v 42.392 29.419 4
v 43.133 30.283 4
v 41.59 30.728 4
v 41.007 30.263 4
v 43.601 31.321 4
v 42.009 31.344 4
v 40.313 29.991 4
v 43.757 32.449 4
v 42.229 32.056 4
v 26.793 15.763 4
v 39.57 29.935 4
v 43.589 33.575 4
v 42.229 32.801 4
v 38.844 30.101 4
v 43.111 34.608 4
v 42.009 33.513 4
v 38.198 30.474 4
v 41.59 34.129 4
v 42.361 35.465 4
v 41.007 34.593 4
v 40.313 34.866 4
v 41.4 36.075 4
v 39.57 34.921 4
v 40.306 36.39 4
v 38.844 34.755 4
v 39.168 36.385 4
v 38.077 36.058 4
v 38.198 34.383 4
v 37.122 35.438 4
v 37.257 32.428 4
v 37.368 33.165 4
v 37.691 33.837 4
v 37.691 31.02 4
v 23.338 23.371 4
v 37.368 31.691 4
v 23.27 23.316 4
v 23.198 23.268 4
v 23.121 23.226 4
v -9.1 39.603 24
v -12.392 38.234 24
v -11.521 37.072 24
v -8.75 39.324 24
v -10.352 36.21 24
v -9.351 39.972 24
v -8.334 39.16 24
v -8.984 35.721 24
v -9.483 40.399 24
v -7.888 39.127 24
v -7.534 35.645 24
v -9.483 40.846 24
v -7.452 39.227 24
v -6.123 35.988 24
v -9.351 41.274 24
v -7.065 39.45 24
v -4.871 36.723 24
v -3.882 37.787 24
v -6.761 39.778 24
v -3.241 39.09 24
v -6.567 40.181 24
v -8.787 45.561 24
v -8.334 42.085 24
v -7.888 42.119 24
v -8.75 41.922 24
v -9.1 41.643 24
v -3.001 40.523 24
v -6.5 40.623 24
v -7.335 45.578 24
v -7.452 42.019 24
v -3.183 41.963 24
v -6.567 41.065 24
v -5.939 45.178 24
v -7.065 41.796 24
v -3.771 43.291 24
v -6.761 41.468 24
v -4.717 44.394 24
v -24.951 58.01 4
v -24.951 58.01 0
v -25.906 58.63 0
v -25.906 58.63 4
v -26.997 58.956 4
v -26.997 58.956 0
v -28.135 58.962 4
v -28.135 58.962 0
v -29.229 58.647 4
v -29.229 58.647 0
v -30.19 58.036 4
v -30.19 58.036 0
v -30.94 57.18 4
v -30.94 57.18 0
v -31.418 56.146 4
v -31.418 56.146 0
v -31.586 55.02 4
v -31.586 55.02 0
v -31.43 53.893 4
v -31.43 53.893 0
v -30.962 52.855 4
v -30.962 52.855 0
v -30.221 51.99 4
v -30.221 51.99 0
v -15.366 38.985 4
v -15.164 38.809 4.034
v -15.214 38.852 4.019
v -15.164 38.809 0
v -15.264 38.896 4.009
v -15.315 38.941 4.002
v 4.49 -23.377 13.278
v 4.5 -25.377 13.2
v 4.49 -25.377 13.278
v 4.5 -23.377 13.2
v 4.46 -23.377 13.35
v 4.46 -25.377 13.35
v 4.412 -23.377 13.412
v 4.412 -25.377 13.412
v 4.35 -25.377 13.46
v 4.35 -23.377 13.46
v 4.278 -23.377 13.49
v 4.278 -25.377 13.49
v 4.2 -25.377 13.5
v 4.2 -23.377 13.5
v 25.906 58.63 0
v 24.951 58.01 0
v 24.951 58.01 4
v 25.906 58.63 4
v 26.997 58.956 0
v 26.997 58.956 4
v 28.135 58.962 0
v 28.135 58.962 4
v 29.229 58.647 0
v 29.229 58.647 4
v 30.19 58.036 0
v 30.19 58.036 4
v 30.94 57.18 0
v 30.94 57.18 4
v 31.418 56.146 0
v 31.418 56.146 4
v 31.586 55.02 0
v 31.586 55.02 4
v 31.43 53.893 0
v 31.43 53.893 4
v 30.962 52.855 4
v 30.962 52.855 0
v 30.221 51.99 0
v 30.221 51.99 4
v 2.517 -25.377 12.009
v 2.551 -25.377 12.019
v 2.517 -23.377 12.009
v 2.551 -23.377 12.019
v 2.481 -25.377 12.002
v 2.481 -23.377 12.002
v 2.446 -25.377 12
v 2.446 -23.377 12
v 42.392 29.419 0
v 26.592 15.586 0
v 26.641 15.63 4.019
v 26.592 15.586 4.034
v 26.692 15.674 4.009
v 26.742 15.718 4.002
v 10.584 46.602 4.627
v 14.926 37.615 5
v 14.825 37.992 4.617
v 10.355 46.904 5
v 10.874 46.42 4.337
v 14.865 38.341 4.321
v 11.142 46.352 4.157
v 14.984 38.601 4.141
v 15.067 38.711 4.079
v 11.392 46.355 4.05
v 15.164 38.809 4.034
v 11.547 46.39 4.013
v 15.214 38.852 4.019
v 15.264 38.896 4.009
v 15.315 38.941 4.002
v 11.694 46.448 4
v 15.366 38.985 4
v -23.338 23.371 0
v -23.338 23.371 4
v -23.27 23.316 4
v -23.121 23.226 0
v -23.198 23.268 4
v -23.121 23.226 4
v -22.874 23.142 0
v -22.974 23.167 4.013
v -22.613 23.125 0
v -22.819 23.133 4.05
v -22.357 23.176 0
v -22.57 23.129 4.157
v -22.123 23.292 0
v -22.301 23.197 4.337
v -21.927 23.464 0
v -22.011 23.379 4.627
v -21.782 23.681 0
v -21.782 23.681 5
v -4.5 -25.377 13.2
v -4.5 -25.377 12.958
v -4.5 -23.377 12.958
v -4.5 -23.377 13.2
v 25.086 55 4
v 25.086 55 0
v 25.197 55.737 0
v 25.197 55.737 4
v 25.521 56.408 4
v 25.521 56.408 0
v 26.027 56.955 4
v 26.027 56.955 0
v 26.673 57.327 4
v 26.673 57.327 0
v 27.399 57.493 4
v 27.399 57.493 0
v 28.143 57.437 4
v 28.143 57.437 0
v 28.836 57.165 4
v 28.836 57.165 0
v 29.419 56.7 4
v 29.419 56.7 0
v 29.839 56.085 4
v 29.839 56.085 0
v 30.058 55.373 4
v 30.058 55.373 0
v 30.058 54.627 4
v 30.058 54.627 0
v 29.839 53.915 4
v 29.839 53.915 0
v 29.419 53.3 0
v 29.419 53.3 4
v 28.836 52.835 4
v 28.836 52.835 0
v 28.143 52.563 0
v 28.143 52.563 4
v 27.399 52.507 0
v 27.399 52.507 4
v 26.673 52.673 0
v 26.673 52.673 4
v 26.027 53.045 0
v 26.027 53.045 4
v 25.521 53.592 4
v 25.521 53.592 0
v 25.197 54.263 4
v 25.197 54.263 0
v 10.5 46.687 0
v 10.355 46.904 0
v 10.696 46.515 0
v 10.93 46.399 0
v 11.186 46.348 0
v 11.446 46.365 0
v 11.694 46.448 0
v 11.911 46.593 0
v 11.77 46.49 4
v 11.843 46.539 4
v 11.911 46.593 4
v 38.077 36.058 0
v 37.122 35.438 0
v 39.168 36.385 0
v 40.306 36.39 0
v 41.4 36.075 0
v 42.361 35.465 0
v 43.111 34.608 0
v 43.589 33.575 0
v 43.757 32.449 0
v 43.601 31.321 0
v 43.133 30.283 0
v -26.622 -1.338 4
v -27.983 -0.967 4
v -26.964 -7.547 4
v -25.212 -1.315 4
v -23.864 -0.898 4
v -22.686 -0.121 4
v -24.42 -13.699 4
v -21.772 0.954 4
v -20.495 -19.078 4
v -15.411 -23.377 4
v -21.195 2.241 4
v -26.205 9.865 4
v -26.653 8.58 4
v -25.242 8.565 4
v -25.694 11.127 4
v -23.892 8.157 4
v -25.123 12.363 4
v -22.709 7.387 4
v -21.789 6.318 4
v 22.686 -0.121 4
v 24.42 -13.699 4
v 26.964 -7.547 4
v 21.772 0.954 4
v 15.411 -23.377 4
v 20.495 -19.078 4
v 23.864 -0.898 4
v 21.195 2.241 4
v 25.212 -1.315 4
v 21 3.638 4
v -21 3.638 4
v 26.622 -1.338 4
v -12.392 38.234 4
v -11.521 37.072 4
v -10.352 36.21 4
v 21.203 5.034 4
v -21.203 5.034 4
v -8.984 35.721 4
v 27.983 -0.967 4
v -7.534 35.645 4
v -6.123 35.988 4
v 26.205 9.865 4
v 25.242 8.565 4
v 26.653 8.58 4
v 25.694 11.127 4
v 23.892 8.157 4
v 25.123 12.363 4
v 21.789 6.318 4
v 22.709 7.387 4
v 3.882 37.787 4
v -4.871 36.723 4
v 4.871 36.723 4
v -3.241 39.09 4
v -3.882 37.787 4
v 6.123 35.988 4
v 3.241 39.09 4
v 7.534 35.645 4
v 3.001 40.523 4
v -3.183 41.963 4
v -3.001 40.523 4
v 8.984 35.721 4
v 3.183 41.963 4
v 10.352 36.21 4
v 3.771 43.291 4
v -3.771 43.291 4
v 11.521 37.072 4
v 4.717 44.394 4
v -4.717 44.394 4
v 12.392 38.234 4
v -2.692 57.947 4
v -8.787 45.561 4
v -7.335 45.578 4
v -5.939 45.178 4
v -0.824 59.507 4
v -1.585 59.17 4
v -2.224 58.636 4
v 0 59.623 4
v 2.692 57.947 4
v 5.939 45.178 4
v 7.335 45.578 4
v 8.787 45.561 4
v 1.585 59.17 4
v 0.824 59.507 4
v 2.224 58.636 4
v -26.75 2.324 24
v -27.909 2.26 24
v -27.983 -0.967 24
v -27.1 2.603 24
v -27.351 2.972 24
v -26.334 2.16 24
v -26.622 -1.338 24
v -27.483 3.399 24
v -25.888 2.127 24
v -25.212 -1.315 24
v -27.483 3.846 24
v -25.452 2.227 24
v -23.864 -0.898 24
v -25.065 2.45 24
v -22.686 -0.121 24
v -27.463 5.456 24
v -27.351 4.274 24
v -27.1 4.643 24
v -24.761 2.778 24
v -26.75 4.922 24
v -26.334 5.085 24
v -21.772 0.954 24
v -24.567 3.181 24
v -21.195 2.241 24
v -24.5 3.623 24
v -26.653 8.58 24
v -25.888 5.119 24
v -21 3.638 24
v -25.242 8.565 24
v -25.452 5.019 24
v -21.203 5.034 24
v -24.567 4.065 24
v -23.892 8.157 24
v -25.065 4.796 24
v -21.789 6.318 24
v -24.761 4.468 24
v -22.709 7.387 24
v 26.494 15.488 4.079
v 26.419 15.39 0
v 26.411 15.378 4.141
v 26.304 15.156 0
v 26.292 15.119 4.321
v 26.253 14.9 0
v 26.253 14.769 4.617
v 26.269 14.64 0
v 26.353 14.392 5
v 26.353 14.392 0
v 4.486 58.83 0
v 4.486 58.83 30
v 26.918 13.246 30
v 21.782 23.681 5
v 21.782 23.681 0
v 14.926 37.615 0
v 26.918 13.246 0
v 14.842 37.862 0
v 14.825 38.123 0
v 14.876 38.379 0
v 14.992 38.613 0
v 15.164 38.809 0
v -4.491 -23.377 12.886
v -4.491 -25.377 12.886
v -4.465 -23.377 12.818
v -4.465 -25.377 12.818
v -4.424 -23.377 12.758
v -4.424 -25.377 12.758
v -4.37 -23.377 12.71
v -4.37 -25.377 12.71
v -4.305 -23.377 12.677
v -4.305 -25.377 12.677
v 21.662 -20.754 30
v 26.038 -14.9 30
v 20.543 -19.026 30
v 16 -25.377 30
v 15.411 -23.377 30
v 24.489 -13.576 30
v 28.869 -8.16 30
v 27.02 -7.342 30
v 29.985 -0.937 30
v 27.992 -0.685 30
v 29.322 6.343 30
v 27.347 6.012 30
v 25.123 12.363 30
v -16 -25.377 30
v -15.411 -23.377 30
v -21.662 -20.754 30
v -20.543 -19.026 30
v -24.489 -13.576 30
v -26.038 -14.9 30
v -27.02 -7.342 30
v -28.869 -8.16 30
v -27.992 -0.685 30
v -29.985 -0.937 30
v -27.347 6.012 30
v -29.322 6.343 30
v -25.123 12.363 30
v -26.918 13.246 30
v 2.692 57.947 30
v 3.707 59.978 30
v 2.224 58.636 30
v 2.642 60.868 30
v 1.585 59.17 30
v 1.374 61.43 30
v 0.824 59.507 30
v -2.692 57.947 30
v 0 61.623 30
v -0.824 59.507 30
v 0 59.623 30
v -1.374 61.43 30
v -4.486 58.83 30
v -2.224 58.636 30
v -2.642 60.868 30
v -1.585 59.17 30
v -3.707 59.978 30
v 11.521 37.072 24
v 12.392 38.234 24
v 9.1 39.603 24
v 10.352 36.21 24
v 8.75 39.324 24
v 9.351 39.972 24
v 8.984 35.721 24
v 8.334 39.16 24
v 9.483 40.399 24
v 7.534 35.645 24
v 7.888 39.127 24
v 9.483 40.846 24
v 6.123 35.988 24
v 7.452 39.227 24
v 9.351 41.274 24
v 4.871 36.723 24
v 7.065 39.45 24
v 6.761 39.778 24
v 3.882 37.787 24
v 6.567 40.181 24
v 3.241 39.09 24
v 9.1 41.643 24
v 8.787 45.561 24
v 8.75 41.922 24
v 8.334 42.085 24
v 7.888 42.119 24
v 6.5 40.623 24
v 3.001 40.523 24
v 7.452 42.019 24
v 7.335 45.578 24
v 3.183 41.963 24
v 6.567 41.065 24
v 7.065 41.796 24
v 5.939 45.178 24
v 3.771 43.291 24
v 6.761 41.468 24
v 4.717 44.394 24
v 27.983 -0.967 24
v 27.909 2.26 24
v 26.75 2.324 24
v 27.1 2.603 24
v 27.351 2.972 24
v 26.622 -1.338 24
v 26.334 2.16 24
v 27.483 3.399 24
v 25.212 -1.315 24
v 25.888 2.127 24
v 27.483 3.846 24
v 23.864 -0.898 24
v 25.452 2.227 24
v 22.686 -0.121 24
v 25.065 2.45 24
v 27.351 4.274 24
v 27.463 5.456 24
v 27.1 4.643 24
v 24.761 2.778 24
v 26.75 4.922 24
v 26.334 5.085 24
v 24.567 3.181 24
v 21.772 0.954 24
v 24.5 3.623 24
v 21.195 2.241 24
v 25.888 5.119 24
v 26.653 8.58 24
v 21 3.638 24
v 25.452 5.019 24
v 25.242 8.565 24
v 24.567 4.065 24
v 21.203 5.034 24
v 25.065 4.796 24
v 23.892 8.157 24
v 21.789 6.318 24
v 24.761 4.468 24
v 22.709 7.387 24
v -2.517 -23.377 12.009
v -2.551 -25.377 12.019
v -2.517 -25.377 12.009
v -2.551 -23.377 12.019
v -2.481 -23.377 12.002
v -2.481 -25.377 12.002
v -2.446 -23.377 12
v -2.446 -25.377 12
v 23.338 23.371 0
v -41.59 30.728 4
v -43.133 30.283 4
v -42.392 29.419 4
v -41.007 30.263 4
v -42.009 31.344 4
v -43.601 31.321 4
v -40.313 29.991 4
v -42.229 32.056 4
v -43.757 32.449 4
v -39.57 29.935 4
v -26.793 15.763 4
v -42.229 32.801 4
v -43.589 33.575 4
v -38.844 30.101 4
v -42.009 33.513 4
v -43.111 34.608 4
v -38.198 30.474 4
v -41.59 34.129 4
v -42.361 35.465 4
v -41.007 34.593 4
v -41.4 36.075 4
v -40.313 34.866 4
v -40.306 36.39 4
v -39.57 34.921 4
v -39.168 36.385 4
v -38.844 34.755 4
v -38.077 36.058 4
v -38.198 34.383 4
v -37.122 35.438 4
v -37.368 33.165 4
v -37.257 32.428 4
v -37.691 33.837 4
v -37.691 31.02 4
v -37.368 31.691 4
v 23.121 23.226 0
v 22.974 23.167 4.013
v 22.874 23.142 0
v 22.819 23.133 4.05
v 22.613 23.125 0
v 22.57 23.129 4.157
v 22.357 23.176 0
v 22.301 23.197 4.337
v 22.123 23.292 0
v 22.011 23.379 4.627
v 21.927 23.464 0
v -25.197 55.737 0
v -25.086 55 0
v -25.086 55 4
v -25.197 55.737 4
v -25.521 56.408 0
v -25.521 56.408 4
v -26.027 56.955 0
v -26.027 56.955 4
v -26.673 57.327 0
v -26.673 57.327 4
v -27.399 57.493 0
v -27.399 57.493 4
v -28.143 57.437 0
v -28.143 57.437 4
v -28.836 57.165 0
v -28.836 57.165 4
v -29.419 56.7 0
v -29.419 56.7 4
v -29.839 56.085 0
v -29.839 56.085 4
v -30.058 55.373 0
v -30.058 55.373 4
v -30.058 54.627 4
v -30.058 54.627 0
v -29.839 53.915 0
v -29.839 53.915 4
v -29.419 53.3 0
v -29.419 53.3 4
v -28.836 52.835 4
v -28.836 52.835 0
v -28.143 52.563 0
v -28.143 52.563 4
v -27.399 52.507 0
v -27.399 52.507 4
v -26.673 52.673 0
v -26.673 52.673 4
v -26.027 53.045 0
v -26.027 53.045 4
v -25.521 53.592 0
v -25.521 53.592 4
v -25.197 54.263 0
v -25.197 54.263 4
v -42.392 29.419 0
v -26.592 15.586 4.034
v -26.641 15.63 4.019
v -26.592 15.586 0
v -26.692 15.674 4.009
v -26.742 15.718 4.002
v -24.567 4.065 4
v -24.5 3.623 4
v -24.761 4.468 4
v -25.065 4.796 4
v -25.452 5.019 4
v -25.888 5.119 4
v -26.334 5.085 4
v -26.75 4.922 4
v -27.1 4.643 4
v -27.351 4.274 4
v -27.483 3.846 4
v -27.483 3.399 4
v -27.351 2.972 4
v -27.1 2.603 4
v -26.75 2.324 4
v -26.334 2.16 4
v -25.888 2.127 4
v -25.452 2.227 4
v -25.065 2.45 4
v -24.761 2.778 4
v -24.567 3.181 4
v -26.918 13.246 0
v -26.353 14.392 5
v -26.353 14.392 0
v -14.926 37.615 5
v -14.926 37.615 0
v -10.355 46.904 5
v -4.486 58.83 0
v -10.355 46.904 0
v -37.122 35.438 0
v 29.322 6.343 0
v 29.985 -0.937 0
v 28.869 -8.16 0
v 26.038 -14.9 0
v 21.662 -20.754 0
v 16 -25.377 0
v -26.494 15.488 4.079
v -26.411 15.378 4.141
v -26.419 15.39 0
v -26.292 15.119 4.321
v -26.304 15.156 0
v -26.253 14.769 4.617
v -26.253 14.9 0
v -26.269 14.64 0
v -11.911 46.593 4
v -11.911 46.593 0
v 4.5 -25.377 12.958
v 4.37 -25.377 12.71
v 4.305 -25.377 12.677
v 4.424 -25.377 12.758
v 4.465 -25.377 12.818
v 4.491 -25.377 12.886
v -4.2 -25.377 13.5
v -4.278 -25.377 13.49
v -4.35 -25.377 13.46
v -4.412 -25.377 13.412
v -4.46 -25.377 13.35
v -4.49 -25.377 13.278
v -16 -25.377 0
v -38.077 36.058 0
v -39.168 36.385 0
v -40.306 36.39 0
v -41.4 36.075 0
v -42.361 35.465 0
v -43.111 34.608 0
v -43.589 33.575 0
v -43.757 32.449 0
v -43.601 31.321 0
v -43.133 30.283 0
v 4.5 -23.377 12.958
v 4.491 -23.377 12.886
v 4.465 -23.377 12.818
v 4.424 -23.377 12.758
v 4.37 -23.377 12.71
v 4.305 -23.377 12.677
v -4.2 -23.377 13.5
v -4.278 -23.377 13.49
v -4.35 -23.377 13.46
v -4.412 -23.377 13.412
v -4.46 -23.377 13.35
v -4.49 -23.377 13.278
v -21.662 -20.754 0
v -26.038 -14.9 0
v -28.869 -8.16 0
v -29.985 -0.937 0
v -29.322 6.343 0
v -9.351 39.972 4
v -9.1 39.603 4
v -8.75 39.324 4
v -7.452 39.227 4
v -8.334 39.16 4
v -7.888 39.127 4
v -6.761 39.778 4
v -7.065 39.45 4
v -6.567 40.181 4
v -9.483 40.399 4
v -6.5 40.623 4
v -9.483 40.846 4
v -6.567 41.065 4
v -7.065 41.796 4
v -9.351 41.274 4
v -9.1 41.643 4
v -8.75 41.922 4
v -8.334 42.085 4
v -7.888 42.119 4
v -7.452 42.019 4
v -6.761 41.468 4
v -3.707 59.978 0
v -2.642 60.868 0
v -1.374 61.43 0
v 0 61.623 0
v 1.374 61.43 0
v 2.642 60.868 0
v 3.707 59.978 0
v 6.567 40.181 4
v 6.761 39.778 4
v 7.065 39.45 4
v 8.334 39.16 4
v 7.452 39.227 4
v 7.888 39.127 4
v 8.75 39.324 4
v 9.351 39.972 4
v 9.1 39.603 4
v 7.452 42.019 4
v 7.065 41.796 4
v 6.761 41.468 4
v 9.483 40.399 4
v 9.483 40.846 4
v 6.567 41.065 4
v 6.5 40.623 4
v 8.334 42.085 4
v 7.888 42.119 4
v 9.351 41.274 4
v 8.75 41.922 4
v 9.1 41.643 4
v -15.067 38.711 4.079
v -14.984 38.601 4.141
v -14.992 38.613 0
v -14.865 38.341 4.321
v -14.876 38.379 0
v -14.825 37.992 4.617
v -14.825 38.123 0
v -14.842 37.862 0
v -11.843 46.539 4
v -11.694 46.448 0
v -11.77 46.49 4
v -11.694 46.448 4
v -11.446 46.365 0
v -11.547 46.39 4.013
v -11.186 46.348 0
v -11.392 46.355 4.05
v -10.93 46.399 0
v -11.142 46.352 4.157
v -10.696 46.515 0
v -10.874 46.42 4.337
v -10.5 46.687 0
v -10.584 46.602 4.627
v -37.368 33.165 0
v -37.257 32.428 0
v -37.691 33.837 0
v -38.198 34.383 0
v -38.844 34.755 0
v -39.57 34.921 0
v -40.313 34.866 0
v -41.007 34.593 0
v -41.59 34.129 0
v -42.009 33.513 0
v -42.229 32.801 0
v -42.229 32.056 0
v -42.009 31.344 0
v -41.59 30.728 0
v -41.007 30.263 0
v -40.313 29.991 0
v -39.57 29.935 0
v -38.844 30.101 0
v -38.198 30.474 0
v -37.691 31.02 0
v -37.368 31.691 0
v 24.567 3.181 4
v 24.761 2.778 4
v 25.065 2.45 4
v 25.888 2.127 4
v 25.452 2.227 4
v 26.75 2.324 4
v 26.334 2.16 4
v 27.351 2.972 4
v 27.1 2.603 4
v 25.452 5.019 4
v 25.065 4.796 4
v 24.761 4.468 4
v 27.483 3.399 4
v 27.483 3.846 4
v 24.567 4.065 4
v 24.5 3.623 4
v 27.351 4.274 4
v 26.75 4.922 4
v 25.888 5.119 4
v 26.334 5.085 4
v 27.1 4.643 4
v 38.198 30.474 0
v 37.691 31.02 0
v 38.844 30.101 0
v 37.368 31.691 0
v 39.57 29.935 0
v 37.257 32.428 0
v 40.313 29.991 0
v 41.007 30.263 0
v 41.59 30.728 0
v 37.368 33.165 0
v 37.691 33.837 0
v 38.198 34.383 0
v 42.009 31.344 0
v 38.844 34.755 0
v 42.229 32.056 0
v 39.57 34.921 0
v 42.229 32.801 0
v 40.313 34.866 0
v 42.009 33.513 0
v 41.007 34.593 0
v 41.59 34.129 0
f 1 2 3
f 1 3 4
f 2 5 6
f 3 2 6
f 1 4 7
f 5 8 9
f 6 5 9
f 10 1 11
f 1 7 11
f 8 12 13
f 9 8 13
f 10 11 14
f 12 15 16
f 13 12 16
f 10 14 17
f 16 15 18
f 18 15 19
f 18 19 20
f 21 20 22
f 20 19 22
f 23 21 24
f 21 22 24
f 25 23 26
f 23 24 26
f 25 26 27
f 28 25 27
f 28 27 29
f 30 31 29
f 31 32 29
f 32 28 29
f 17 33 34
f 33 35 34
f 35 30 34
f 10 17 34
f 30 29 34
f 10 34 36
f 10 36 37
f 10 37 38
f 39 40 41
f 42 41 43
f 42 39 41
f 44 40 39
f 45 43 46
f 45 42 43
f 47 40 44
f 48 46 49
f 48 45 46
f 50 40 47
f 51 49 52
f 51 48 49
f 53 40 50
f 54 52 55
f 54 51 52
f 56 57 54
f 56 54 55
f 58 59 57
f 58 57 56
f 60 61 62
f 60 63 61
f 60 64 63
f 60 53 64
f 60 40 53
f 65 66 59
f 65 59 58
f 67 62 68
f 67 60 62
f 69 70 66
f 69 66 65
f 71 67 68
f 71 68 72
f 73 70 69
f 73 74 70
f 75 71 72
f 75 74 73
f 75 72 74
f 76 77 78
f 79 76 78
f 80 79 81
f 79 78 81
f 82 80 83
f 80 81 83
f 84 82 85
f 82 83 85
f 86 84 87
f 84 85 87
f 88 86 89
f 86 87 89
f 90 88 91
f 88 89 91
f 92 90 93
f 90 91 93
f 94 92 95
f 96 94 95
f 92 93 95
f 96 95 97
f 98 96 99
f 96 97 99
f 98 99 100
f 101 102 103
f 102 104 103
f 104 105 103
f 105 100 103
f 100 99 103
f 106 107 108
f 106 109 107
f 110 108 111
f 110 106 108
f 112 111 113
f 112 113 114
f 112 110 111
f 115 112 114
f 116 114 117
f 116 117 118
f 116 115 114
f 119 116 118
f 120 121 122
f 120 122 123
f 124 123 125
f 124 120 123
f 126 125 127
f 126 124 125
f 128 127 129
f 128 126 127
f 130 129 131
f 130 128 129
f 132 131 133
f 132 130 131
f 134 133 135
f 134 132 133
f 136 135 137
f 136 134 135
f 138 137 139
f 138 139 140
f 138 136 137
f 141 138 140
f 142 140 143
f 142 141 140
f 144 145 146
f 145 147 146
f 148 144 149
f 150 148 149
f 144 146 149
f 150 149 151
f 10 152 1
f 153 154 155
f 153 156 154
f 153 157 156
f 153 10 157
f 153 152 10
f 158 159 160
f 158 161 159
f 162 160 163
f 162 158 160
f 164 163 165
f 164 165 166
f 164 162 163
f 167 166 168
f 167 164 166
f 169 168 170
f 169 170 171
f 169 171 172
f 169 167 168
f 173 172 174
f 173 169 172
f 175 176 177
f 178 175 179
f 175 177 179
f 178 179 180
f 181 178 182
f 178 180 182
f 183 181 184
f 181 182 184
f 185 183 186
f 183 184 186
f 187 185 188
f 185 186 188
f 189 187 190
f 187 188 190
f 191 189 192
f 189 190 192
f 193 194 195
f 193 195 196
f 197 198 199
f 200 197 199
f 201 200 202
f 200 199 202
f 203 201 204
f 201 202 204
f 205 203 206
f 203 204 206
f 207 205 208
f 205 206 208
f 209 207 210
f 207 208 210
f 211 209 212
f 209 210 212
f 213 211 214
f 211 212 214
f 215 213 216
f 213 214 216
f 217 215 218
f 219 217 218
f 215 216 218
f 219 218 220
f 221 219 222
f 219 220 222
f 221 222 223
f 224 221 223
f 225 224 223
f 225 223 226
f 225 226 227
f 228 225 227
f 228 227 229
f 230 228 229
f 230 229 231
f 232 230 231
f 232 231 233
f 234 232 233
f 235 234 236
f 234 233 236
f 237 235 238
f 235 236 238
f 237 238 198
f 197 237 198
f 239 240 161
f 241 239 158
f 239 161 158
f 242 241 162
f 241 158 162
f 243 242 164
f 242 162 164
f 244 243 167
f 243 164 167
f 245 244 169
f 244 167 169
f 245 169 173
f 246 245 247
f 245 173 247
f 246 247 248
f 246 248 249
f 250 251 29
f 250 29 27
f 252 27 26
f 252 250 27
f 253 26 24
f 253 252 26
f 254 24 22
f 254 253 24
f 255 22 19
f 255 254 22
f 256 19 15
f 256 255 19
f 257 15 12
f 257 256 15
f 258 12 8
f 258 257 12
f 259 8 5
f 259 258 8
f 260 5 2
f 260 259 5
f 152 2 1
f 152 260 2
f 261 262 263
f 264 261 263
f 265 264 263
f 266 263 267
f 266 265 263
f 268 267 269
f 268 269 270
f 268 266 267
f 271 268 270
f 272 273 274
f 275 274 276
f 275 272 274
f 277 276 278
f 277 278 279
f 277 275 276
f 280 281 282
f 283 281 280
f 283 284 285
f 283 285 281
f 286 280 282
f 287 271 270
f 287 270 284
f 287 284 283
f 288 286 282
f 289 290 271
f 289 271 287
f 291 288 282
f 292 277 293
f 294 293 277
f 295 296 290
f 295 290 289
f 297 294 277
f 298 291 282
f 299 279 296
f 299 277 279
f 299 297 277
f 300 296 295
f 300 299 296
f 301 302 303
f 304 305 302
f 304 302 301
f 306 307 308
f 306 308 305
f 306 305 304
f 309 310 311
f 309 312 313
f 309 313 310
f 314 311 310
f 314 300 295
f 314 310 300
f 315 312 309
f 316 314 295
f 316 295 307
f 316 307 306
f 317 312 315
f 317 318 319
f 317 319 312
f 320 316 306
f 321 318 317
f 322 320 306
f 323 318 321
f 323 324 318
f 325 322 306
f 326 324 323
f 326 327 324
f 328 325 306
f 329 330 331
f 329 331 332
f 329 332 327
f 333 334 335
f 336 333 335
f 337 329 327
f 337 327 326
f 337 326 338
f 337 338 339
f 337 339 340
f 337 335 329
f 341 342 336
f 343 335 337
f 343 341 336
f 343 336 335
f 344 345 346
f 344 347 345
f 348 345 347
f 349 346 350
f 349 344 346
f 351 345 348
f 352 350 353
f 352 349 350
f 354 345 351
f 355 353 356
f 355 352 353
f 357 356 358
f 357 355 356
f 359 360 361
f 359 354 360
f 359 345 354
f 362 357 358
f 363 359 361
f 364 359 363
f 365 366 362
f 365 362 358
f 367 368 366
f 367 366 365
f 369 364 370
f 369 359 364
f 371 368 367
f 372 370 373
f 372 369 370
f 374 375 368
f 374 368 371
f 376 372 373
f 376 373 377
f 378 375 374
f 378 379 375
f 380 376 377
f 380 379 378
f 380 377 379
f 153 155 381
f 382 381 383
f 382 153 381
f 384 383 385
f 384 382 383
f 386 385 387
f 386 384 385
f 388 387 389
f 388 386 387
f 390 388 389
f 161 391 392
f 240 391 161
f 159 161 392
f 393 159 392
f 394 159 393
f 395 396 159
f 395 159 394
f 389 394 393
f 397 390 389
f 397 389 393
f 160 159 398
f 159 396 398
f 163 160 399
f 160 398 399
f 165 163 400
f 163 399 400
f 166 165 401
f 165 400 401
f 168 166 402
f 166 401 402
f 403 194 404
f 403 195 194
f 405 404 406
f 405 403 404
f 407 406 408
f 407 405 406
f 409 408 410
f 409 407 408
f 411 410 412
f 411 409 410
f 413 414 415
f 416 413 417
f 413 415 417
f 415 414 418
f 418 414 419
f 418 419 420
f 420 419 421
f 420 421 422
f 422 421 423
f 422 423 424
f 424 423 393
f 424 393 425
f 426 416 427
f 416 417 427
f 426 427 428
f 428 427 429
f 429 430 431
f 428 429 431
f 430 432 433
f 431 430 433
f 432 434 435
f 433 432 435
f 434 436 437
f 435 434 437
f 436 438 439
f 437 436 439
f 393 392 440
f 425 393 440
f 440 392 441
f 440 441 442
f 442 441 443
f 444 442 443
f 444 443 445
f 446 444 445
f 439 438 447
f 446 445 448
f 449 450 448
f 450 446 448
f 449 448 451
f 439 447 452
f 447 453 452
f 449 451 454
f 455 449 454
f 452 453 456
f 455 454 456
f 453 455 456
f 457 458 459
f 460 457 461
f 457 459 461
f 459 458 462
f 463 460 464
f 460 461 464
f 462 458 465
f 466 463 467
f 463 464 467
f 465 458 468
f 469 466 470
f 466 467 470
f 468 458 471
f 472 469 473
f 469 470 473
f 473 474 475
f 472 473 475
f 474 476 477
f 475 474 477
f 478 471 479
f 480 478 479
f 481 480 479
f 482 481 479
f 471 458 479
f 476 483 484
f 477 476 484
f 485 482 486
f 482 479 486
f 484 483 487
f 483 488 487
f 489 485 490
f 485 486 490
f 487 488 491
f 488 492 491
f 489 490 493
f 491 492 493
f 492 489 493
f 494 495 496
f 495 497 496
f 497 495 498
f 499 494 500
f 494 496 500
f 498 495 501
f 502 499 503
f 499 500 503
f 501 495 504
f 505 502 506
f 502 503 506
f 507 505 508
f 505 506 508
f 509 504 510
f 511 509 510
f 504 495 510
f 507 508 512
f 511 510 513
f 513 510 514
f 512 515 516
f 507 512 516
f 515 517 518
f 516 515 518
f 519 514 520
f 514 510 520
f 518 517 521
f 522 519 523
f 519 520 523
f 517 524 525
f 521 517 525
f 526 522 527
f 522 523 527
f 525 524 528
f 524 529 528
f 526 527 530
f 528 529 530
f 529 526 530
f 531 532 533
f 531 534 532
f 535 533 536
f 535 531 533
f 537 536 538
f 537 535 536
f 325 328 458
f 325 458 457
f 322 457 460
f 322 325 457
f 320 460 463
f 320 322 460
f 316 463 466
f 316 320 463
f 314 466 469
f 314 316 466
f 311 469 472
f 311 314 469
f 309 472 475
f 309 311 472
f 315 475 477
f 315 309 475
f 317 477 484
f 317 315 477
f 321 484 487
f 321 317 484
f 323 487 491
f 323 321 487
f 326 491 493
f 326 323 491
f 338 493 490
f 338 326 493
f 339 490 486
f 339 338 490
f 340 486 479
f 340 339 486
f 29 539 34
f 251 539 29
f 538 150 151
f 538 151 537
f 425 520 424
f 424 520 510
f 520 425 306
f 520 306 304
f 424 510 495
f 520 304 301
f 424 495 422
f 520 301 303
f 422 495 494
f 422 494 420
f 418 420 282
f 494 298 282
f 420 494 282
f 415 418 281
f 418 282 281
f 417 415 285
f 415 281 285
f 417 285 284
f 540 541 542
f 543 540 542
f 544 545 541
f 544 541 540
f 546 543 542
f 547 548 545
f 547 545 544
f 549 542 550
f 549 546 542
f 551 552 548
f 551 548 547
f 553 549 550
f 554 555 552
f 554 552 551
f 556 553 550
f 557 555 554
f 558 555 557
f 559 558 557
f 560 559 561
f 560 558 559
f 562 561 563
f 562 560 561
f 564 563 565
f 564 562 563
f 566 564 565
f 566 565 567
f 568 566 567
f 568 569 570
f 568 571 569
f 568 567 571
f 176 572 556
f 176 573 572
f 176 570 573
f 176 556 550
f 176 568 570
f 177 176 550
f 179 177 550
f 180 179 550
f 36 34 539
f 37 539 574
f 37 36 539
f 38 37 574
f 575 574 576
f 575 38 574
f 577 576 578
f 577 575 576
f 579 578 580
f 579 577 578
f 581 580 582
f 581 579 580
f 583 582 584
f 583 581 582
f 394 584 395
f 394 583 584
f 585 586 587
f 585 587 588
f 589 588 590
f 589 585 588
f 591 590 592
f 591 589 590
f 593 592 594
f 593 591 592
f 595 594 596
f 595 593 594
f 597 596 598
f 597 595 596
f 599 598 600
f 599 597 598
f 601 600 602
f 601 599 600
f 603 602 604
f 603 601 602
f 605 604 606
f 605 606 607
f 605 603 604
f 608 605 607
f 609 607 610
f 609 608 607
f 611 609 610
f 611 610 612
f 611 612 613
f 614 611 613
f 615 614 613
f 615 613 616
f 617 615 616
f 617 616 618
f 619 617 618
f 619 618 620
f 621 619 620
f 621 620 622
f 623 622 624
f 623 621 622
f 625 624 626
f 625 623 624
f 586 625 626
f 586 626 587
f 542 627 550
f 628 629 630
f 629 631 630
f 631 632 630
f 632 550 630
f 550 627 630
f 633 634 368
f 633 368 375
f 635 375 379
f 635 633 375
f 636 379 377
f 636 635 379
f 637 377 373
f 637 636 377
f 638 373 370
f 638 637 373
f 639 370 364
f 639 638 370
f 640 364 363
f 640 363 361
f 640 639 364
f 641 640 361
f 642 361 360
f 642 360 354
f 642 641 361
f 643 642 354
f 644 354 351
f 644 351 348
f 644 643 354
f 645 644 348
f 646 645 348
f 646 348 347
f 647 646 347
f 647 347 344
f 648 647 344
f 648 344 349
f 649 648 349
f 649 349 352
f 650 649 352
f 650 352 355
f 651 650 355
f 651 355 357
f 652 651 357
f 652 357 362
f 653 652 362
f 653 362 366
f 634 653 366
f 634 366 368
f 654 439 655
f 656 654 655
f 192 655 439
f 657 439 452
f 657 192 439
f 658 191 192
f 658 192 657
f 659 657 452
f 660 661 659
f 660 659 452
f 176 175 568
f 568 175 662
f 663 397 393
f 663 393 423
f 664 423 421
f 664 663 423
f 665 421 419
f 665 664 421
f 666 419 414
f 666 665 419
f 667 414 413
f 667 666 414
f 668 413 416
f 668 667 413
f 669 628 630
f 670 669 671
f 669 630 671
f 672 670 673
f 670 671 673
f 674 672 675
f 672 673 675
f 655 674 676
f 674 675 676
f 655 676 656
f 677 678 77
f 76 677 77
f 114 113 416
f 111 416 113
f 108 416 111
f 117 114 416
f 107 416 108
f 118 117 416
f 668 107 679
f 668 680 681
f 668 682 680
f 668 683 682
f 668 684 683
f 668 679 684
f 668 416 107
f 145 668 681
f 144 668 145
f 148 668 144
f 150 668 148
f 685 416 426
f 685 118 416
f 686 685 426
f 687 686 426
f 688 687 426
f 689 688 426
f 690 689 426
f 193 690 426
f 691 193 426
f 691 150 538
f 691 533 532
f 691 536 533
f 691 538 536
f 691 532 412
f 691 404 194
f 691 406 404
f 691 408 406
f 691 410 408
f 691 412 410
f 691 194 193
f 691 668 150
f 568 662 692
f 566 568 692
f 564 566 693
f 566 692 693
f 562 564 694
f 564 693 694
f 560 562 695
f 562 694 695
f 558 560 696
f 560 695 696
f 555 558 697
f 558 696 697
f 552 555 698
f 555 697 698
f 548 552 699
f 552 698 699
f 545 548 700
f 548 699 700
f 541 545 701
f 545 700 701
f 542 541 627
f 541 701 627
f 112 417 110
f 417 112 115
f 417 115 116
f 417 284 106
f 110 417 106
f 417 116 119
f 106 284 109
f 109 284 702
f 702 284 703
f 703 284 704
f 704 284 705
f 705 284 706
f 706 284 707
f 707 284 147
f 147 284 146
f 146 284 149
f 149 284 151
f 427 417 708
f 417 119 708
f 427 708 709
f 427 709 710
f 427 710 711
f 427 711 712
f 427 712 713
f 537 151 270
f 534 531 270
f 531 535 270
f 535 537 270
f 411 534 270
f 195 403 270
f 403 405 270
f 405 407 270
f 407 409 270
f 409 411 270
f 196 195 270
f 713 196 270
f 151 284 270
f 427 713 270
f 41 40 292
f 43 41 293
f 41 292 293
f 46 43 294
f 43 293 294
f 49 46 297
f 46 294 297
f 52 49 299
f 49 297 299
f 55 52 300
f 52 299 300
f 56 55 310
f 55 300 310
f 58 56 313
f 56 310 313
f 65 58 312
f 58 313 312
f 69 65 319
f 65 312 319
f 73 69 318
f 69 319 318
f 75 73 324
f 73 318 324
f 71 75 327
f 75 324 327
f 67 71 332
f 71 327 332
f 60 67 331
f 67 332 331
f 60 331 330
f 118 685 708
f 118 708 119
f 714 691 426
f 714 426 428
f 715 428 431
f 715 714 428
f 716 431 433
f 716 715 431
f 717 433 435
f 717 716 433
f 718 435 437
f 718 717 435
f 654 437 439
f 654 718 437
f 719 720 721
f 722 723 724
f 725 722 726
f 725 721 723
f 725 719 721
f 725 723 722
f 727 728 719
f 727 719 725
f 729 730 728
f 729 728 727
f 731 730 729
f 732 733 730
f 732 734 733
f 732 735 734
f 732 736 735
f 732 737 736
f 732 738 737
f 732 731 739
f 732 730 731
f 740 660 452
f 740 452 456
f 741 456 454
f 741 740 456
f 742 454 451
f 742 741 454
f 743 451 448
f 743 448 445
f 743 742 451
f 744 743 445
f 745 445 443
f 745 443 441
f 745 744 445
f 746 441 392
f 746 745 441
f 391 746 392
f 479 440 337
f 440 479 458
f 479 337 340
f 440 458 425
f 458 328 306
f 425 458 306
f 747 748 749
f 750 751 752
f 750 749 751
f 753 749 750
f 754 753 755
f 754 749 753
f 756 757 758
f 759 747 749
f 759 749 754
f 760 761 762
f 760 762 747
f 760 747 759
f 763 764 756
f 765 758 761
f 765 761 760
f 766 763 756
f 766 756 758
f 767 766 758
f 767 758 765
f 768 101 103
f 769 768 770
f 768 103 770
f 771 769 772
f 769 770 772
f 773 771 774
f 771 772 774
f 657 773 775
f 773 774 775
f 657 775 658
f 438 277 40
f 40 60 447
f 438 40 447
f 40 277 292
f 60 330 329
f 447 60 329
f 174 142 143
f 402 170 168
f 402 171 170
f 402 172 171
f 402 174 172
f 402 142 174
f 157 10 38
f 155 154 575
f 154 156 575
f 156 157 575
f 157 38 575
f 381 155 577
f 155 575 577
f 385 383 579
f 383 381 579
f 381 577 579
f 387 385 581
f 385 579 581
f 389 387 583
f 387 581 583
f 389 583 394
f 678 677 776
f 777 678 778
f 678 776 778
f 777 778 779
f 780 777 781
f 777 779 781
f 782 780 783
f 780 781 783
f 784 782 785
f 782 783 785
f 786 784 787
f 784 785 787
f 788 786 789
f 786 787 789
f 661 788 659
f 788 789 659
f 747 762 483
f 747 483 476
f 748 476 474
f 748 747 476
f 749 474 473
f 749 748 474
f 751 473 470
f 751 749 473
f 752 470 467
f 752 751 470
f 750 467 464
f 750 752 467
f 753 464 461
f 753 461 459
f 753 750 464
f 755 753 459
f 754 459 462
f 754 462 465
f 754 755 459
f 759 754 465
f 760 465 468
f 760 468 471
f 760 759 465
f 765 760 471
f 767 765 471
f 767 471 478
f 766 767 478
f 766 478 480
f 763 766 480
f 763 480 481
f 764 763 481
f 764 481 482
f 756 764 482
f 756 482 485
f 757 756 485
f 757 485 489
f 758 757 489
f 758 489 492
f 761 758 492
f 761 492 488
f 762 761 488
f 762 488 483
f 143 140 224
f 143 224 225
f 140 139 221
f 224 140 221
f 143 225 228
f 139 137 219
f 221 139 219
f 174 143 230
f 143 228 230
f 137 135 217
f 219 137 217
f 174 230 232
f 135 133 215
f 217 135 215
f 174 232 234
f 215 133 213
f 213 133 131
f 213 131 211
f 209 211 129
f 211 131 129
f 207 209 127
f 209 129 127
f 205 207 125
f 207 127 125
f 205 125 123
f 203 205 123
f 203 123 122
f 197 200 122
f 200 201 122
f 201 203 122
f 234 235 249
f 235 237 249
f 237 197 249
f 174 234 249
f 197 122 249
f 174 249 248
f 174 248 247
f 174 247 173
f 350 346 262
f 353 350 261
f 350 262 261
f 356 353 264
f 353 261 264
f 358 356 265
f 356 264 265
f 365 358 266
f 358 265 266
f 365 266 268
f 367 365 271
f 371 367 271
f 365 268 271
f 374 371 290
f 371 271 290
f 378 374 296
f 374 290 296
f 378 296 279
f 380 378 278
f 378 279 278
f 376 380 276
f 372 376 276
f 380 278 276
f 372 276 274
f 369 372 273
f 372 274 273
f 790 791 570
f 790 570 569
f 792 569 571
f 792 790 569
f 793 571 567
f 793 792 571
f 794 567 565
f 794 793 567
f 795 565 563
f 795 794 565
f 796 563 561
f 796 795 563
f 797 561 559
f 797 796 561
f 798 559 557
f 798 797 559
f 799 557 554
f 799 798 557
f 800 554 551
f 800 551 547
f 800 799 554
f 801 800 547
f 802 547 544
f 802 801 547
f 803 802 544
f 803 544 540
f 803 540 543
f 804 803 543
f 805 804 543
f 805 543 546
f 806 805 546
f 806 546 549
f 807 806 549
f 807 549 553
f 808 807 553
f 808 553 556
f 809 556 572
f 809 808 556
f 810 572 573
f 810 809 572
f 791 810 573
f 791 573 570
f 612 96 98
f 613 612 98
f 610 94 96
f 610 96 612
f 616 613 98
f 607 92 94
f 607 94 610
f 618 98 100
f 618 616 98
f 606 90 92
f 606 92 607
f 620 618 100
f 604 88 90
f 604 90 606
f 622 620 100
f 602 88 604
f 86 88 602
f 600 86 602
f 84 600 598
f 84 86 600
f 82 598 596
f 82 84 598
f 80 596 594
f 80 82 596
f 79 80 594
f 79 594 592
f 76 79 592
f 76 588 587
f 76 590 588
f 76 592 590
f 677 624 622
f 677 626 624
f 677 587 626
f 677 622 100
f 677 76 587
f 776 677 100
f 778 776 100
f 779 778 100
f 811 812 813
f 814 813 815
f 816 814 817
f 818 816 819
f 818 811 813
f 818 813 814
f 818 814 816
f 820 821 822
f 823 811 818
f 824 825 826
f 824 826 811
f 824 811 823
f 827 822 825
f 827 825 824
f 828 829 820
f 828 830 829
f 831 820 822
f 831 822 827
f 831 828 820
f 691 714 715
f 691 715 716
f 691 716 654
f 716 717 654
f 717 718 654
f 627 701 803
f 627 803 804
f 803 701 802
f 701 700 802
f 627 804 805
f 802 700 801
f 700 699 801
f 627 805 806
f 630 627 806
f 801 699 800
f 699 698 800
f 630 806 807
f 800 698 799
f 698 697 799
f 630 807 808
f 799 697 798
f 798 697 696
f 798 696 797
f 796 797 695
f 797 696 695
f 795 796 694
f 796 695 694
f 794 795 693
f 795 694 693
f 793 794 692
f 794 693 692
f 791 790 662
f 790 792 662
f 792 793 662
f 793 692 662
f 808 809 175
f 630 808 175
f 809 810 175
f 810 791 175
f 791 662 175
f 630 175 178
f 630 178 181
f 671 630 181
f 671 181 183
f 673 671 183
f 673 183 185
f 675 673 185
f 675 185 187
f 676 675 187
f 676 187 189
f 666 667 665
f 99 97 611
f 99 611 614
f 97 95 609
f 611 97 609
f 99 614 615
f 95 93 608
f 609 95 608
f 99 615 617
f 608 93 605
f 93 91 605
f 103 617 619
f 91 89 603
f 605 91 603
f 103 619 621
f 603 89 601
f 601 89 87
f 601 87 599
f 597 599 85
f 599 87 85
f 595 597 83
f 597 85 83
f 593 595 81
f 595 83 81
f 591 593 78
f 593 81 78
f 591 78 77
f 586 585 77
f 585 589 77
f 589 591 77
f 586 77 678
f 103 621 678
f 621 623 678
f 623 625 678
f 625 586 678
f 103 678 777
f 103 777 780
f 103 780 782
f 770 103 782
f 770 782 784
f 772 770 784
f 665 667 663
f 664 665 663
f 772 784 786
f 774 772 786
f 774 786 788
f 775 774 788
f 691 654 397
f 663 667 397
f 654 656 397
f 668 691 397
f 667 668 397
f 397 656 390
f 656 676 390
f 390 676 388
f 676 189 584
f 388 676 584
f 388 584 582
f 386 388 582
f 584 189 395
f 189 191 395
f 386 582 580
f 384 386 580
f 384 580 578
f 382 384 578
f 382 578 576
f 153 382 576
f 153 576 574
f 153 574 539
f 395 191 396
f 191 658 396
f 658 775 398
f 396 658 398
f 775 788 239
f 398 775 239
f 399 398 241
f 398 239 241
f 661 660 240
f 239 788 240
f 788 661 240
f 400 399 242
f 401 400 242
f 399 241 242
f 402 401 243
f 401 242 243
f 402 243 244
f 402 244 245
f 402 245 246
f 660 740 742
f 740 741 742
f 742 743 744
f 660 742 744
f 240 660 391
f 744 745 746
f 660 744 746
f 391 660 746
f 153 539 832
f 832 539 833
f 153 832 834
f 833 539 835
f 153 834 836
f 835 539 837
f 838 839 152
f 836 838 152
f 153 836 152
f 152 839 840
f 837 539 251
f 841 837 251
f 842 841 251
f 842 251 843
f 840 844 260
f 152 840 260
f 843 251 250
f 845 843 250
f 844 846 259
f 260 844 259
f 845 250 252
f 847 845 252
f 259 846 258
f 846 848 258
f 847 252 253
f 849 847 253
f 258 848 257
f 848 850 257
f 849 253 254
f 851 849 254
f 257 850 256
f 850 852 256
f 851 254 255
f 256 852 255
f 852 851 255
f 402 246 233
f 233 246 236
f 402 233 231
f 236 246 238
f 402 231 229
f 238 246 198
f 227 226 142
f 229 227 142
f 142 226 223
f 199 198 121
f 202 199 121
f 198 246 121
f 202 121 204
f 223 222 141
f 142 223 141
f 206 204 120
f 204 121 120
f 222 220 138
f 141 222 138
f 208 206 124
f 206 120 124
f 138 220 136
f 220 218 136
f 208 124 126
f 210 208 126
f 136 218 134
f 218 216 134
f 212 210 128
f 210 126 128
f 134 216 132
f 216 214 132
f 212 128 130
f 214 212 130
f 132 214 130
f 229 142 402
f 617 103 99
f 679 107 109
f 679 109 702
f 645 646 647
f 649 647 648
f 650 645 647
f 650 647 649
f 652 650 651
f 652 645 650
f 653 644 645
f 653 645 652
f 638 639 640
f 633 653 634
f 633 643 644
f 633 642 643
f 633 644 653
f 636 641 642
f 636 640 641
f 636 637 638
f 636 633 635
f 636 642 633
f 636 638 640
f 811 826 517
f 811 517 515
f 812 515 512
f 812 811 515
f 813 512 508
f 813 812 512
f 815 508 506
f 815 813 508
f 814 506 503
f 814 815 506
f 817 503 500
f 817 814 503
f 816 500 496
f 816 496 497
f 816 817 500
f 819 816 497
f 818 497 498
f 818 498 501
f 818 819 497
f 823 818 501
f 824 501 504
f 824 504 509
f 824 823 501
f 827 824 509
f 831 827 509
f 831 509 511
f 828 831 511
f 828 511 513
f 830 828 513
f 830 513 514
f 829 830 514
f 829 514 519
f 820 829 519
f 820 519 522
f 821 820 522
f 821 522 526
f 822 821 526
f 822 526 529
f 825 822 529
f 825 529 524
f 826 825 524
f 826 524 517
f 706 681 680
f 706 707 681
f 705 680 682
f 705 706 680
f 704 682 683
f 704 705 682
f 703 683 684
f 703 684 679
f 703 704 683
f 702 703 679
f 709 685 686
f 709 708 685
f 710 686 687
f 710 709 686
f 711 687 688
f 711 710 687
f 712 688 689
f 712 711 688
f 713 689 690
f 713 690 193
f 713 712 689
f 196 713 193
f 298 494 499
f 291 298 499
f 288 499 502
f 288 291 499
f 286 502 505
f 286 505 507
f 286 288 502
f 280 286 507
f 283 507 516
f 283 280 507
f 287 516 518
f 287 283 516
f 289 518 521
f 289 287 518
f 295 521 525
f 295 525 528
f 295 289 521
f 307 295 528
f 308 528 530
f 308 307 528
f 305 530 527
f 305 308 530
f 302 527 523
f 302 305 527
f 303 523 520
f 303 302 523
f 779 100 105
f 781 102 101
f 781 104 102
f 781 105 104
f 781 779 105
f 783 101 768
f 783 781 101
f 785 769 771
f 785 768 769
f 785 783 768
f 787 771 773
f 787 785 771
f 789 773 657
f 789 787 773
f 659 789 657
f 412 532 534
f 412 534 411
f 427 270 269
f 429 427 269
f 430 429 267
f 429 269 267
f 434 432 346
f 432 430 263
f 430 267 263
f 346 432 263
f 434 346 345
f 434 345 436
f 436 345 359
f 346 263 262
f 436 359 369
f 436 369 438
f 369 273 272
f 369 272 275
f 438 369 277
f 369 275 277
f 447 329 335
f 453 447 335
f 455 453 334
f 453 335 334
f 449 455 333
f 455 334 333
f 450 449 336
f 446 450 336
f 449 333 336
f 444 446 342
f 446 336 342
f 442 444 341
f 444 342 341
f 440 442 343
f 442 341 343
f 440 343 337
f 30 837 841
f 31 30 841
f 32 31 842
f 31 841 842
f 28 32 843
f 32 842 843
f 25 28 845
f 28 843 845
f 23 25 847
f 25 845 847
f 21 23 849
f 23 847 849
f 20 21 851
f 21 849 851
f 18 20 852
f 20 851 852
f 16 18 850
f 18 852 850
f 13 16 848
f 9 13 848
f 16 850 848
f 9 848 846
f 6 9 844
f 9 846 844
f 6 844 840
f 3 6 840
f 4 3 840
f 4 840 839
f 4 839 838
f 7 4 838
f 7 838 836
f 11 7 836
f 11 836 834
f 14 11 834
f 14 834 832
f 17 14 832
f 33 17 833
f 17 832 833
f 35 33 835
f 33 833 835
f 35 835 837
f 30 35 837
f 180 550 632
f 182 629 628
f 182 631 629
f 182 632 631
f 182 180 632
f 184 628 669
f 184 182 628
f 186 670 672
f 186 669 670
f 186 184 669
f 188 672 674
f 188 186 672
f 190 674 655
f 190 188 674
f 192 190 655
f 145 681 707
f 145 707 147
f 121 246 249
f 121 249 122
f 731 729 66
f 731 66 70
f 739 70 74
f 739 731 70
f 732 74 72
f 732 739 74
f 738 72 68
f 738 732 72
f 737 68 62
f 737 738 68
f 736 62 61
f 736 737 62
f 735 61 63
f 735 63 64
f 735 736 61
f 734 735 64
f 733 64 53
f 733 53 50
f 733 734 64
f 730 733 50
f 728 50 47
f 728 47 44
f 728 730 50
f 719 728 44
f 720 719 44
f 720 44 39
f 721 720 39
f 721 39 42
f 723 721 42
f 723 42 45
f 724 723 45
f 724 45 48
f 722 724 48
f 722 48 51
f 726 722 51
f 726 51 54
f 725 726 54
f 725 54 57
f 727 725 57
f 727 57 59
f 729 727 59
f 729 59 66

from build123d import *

# Parameters (mm, degrees)
BASE_SHELL_DEPTH         = 30
COQUE1_T                 = -2
COQUE1_THICKNESS_2_DEPTH = 2
ESQUISSE4_R              = 1.5
BOSS_EXTRU_2_DEPTH       = 24
ESQUISSE6_R              = 2.5
BOSS_EXTRU_3_DEPTH       = 4
CONG_2_R                 = 1
ENL_V_MAT_EXTRU_1_DEPTH  = 2
CONG_3_R                 = 0.3


with BuildPart() as part:
    # Esquisse2 → Base shell (new body)
    with BuildSketch(Plane.XY):
        with BuildLine():
            Line((-26.917573139, 13.245537222), (-4.48626219, 58.830434456))
            ThreePointArc((-4.48626219, 58.830434456), (0, 61.622844919), (4.48626219, 58.830434456))
            Line((4.48626219, 58.830434456), (26.917573139, 13.245537222))
            ThreePointArc((26.917573139, 13.245537222), (28.868799962, -8.160415969), (16, -25.377155081))
            Line((16, -25.377155081), (-16, -25.377155081))
            ThreePointArc((-16, -25.377155081), (-28.868799962, -8.160415969), (-26.917573139, 13.245537222))
        make_face()
    extrude(amount=BASE_SHELL_DEPTH)

    # Coque1
    coque1_openings = [part.faces().sort_by_distance(p)[0] for p in [
        (0, 9.805982993, 30),
    ]]
    offset(amount=COQUE1_T, openings=coque1_openings, kind=Kind.INTERSECTION)

    # Coque1 thickness 2 face (on inner face of the shell) → Coque1 thickness 2 (add)
    with BuildSketch(Plane(origin=(0, 9.437987549, 2), x_dir=(-1, 0, 0), z_dir=(0, 0, -1))):
        with BuildLine():
            Line((2.691757314, 48.509411092), (25.123068263, 2.924513858))
            ThreePointArc((25.123068263, 2.924513858), (27.020174162, -16.780343321), (15.411314685, -32.81514263))
            Line((15.411314685, -32.81514263), (-15.411314685, -32.81514263))
            ThreePointArc((-15.411314685, -32.81514263), (-27.020174162, -16.780343321), (-25.123068263, 2.924513858))
            Line((-25.123068263, 2.924513858), (-2.691757314, 48.509411092))
            ThreePointArc((-2.691757314, 48.509411092), (0, 50.18485737), (2.691757314, 48.509411092))
        make_face()
    extrude(amount=-COQUE1_THICKNESS_2_DEPTH)

    # Esquisse4 → Boss.-Extru.2 (add)
    # profile 1 of 4: a face of its own
    with BuildSketch(Plane.XY):
        with BuildLine():
            Line((-8.787069617, 45.560508478), (-12.392350614, 38.233858506))
            ThreePointArc((-12.392350614, 38.233858506), (-3.51373781, 38.415255382), (-8.787069617, 45.560508478))
        make_face()
        with Locations((-8, 40.622844919)):
            Circle(ESQUISSE4_R, mode=Mode.SUBTRACT)
    # profile 2 of 4: a face of its own
    with BuildSketch(Plane.XY):
        with BuildLine():
            Line((8.787069617, 45.560508478), (12.392350614, 38.233858506))
            ThreePointArc((12.392350614, 38.233858506), (3.51373781, 38.415255382), (8.787069617, 45.560508478))
        make_face()
        with Locations(Location((8, 40.622844919, 0), (0, 0, 180))):
            Circle(ESQUISSE4_R, mode=Mode.SUBTRACT)
    # profile 3 of 4: a face of its own
    with BuildSketch(Plane.XY):
        with BuildLine():
            ThreePointArc((-27.983297548, -0.966984145), (-21.047843649, 2.932810516), (-26.653016398, 8.580018467))
            ThreePointArc((-26.653016398, 8.580018467), (-27.732075565, 3.864192656), (-27.983297548, -0.966984145))
        make_face()
        with Locations((-26, 3.622844919)):
            Circle(ESQUISSE4_R, mode=Mode.SUBTRACT)
    # profile 4 of 4: a face of its own
    with BuildSketch(Plane.XY):
        with BuildLine():
            ThreePointArc((27.983297548, -0.966984145), (21.047843649, 2.932810516), (26.653016398, 8.580018467))
            ThreePointArc((26.653016398, 8.580018467), (27.732075565, 3.864192656), (27.983297548, -0.966984145))
        make_face()
        with Locations(Location((26, 3.622844919, 0), (0, 0, 180))):
            Circle(ESQUISSE4_R, mode=Mode.SUBTRACT)
    extrude(amount=BOSS_EXTRU_2_DEPTH)

    # Esquisse6 → Boss.-Extru.3 (add)
    # profile 1 of 2: a face of its own
    with BuildSketch(Plane.XY):
        with BuildLine():
            Line((0, 36.165725179), (-24.951408489, 58.009624237))
            ThreePointArc((-24.951408489, 58.009624237), (-30.595831001, 57.634798275), (-30.221005039, 51.990375763))
            Line((-30.221005039, 51.990375763), (0, 25.533168595))
            Line((0, 25.533168595), (0, 36.165725179))
        make_face()
        with Locations((-27.586206764, 55)):
            Circle(ESQUISSE6_R, mode=Mode.SUBTRACT)
    # profile 2 of 2: a face of its own
    with BuildSketch(Plane.XY):
        with BuildLine():
            Line((0, 2.938985855), (-37.122207588, 35.437902929))
            ThreePointArc((-37.122207588, 35.437902929), (-42.7666301, 35.063076966), (-42.391804138, 29.418654454))
            Line((-42.391804138, 29.418654454), (0, -7.693570729))
            Line((0, -7.693570729), (0, 2.938985855))
        make_face()
        with Locations((-39.757005863, 32.428278691)):
            Circle(ESQUISSE6_R, mode=Mode.SUBTRACT)
    boss_extru_3 = extrude(amount=BOSS_EXTRU_3_DEPTH)

    # Symétrie1: Boss.-Extru.3 across plane
    add(boss_extru_3.mirror(Plane(origin=(0, 0, 0), x_dir=(0, 0, 1), z_dir=(1, 0, 0))))

    # Congé2
    cong_2_edges = [part.edges().sort_by_distance(p)[0] for p in [
        (-14.587086989, 38.303544098, 2),
        (-10.930343207, 45.734776713, 2),
        (-24.186039417, 18.796558485, 4),
        (-22.357667526, 22.512174792, 2),
        (-26.014411308, 15.080942177, 2),
        (12.758715098, 42.019160406, 4),
        (14.587086989, 38.303544098, 2),
        (10.930343207, 45.734776713, 2),
        (24.186039417, 18.796558485, 4),
        (22.357667526, 22.512174792, 2),
        (26.014411308, 15.080942177, 2),
        (-12.758715098, 42.019160406, 4),
    ]]
    fillet(cong_2_edges, radius=CONG_2_R)

    # Esquisse8 → Enlèv. mat.-Extru.1 (cut)
    with BuildSketch(Plane.XZ.offset(25.377155081)):
        Polygon((2.5, 12), (-2.5, 12), (-4.5, 12.75), (-4.5, 13.5), (4.5, 13.5), (4.5, 12.75), align=None)
    extrude(amount=-ENL_V_MAT_EXTRU_1_DEPTH, mode=Mode.SUBTRACT)

    # Congé3
    cong_3_edges = [part.edges().sort_by_distance(p)[0] for p in [
        (2.5, -24.377155081, 12),
        (4.5, -24.377155081, 12.75),
        (4.5, -24.377155081, 13.5),
        (-4.5, -24.377155081, 13.5),
        (-4.5, -24.377155081, 12.75),
        (-2.5, -24.377155081, 12),
    ]]
    fillet(cong_3_edges, radius=CONG_3_R)


solid = part.part
